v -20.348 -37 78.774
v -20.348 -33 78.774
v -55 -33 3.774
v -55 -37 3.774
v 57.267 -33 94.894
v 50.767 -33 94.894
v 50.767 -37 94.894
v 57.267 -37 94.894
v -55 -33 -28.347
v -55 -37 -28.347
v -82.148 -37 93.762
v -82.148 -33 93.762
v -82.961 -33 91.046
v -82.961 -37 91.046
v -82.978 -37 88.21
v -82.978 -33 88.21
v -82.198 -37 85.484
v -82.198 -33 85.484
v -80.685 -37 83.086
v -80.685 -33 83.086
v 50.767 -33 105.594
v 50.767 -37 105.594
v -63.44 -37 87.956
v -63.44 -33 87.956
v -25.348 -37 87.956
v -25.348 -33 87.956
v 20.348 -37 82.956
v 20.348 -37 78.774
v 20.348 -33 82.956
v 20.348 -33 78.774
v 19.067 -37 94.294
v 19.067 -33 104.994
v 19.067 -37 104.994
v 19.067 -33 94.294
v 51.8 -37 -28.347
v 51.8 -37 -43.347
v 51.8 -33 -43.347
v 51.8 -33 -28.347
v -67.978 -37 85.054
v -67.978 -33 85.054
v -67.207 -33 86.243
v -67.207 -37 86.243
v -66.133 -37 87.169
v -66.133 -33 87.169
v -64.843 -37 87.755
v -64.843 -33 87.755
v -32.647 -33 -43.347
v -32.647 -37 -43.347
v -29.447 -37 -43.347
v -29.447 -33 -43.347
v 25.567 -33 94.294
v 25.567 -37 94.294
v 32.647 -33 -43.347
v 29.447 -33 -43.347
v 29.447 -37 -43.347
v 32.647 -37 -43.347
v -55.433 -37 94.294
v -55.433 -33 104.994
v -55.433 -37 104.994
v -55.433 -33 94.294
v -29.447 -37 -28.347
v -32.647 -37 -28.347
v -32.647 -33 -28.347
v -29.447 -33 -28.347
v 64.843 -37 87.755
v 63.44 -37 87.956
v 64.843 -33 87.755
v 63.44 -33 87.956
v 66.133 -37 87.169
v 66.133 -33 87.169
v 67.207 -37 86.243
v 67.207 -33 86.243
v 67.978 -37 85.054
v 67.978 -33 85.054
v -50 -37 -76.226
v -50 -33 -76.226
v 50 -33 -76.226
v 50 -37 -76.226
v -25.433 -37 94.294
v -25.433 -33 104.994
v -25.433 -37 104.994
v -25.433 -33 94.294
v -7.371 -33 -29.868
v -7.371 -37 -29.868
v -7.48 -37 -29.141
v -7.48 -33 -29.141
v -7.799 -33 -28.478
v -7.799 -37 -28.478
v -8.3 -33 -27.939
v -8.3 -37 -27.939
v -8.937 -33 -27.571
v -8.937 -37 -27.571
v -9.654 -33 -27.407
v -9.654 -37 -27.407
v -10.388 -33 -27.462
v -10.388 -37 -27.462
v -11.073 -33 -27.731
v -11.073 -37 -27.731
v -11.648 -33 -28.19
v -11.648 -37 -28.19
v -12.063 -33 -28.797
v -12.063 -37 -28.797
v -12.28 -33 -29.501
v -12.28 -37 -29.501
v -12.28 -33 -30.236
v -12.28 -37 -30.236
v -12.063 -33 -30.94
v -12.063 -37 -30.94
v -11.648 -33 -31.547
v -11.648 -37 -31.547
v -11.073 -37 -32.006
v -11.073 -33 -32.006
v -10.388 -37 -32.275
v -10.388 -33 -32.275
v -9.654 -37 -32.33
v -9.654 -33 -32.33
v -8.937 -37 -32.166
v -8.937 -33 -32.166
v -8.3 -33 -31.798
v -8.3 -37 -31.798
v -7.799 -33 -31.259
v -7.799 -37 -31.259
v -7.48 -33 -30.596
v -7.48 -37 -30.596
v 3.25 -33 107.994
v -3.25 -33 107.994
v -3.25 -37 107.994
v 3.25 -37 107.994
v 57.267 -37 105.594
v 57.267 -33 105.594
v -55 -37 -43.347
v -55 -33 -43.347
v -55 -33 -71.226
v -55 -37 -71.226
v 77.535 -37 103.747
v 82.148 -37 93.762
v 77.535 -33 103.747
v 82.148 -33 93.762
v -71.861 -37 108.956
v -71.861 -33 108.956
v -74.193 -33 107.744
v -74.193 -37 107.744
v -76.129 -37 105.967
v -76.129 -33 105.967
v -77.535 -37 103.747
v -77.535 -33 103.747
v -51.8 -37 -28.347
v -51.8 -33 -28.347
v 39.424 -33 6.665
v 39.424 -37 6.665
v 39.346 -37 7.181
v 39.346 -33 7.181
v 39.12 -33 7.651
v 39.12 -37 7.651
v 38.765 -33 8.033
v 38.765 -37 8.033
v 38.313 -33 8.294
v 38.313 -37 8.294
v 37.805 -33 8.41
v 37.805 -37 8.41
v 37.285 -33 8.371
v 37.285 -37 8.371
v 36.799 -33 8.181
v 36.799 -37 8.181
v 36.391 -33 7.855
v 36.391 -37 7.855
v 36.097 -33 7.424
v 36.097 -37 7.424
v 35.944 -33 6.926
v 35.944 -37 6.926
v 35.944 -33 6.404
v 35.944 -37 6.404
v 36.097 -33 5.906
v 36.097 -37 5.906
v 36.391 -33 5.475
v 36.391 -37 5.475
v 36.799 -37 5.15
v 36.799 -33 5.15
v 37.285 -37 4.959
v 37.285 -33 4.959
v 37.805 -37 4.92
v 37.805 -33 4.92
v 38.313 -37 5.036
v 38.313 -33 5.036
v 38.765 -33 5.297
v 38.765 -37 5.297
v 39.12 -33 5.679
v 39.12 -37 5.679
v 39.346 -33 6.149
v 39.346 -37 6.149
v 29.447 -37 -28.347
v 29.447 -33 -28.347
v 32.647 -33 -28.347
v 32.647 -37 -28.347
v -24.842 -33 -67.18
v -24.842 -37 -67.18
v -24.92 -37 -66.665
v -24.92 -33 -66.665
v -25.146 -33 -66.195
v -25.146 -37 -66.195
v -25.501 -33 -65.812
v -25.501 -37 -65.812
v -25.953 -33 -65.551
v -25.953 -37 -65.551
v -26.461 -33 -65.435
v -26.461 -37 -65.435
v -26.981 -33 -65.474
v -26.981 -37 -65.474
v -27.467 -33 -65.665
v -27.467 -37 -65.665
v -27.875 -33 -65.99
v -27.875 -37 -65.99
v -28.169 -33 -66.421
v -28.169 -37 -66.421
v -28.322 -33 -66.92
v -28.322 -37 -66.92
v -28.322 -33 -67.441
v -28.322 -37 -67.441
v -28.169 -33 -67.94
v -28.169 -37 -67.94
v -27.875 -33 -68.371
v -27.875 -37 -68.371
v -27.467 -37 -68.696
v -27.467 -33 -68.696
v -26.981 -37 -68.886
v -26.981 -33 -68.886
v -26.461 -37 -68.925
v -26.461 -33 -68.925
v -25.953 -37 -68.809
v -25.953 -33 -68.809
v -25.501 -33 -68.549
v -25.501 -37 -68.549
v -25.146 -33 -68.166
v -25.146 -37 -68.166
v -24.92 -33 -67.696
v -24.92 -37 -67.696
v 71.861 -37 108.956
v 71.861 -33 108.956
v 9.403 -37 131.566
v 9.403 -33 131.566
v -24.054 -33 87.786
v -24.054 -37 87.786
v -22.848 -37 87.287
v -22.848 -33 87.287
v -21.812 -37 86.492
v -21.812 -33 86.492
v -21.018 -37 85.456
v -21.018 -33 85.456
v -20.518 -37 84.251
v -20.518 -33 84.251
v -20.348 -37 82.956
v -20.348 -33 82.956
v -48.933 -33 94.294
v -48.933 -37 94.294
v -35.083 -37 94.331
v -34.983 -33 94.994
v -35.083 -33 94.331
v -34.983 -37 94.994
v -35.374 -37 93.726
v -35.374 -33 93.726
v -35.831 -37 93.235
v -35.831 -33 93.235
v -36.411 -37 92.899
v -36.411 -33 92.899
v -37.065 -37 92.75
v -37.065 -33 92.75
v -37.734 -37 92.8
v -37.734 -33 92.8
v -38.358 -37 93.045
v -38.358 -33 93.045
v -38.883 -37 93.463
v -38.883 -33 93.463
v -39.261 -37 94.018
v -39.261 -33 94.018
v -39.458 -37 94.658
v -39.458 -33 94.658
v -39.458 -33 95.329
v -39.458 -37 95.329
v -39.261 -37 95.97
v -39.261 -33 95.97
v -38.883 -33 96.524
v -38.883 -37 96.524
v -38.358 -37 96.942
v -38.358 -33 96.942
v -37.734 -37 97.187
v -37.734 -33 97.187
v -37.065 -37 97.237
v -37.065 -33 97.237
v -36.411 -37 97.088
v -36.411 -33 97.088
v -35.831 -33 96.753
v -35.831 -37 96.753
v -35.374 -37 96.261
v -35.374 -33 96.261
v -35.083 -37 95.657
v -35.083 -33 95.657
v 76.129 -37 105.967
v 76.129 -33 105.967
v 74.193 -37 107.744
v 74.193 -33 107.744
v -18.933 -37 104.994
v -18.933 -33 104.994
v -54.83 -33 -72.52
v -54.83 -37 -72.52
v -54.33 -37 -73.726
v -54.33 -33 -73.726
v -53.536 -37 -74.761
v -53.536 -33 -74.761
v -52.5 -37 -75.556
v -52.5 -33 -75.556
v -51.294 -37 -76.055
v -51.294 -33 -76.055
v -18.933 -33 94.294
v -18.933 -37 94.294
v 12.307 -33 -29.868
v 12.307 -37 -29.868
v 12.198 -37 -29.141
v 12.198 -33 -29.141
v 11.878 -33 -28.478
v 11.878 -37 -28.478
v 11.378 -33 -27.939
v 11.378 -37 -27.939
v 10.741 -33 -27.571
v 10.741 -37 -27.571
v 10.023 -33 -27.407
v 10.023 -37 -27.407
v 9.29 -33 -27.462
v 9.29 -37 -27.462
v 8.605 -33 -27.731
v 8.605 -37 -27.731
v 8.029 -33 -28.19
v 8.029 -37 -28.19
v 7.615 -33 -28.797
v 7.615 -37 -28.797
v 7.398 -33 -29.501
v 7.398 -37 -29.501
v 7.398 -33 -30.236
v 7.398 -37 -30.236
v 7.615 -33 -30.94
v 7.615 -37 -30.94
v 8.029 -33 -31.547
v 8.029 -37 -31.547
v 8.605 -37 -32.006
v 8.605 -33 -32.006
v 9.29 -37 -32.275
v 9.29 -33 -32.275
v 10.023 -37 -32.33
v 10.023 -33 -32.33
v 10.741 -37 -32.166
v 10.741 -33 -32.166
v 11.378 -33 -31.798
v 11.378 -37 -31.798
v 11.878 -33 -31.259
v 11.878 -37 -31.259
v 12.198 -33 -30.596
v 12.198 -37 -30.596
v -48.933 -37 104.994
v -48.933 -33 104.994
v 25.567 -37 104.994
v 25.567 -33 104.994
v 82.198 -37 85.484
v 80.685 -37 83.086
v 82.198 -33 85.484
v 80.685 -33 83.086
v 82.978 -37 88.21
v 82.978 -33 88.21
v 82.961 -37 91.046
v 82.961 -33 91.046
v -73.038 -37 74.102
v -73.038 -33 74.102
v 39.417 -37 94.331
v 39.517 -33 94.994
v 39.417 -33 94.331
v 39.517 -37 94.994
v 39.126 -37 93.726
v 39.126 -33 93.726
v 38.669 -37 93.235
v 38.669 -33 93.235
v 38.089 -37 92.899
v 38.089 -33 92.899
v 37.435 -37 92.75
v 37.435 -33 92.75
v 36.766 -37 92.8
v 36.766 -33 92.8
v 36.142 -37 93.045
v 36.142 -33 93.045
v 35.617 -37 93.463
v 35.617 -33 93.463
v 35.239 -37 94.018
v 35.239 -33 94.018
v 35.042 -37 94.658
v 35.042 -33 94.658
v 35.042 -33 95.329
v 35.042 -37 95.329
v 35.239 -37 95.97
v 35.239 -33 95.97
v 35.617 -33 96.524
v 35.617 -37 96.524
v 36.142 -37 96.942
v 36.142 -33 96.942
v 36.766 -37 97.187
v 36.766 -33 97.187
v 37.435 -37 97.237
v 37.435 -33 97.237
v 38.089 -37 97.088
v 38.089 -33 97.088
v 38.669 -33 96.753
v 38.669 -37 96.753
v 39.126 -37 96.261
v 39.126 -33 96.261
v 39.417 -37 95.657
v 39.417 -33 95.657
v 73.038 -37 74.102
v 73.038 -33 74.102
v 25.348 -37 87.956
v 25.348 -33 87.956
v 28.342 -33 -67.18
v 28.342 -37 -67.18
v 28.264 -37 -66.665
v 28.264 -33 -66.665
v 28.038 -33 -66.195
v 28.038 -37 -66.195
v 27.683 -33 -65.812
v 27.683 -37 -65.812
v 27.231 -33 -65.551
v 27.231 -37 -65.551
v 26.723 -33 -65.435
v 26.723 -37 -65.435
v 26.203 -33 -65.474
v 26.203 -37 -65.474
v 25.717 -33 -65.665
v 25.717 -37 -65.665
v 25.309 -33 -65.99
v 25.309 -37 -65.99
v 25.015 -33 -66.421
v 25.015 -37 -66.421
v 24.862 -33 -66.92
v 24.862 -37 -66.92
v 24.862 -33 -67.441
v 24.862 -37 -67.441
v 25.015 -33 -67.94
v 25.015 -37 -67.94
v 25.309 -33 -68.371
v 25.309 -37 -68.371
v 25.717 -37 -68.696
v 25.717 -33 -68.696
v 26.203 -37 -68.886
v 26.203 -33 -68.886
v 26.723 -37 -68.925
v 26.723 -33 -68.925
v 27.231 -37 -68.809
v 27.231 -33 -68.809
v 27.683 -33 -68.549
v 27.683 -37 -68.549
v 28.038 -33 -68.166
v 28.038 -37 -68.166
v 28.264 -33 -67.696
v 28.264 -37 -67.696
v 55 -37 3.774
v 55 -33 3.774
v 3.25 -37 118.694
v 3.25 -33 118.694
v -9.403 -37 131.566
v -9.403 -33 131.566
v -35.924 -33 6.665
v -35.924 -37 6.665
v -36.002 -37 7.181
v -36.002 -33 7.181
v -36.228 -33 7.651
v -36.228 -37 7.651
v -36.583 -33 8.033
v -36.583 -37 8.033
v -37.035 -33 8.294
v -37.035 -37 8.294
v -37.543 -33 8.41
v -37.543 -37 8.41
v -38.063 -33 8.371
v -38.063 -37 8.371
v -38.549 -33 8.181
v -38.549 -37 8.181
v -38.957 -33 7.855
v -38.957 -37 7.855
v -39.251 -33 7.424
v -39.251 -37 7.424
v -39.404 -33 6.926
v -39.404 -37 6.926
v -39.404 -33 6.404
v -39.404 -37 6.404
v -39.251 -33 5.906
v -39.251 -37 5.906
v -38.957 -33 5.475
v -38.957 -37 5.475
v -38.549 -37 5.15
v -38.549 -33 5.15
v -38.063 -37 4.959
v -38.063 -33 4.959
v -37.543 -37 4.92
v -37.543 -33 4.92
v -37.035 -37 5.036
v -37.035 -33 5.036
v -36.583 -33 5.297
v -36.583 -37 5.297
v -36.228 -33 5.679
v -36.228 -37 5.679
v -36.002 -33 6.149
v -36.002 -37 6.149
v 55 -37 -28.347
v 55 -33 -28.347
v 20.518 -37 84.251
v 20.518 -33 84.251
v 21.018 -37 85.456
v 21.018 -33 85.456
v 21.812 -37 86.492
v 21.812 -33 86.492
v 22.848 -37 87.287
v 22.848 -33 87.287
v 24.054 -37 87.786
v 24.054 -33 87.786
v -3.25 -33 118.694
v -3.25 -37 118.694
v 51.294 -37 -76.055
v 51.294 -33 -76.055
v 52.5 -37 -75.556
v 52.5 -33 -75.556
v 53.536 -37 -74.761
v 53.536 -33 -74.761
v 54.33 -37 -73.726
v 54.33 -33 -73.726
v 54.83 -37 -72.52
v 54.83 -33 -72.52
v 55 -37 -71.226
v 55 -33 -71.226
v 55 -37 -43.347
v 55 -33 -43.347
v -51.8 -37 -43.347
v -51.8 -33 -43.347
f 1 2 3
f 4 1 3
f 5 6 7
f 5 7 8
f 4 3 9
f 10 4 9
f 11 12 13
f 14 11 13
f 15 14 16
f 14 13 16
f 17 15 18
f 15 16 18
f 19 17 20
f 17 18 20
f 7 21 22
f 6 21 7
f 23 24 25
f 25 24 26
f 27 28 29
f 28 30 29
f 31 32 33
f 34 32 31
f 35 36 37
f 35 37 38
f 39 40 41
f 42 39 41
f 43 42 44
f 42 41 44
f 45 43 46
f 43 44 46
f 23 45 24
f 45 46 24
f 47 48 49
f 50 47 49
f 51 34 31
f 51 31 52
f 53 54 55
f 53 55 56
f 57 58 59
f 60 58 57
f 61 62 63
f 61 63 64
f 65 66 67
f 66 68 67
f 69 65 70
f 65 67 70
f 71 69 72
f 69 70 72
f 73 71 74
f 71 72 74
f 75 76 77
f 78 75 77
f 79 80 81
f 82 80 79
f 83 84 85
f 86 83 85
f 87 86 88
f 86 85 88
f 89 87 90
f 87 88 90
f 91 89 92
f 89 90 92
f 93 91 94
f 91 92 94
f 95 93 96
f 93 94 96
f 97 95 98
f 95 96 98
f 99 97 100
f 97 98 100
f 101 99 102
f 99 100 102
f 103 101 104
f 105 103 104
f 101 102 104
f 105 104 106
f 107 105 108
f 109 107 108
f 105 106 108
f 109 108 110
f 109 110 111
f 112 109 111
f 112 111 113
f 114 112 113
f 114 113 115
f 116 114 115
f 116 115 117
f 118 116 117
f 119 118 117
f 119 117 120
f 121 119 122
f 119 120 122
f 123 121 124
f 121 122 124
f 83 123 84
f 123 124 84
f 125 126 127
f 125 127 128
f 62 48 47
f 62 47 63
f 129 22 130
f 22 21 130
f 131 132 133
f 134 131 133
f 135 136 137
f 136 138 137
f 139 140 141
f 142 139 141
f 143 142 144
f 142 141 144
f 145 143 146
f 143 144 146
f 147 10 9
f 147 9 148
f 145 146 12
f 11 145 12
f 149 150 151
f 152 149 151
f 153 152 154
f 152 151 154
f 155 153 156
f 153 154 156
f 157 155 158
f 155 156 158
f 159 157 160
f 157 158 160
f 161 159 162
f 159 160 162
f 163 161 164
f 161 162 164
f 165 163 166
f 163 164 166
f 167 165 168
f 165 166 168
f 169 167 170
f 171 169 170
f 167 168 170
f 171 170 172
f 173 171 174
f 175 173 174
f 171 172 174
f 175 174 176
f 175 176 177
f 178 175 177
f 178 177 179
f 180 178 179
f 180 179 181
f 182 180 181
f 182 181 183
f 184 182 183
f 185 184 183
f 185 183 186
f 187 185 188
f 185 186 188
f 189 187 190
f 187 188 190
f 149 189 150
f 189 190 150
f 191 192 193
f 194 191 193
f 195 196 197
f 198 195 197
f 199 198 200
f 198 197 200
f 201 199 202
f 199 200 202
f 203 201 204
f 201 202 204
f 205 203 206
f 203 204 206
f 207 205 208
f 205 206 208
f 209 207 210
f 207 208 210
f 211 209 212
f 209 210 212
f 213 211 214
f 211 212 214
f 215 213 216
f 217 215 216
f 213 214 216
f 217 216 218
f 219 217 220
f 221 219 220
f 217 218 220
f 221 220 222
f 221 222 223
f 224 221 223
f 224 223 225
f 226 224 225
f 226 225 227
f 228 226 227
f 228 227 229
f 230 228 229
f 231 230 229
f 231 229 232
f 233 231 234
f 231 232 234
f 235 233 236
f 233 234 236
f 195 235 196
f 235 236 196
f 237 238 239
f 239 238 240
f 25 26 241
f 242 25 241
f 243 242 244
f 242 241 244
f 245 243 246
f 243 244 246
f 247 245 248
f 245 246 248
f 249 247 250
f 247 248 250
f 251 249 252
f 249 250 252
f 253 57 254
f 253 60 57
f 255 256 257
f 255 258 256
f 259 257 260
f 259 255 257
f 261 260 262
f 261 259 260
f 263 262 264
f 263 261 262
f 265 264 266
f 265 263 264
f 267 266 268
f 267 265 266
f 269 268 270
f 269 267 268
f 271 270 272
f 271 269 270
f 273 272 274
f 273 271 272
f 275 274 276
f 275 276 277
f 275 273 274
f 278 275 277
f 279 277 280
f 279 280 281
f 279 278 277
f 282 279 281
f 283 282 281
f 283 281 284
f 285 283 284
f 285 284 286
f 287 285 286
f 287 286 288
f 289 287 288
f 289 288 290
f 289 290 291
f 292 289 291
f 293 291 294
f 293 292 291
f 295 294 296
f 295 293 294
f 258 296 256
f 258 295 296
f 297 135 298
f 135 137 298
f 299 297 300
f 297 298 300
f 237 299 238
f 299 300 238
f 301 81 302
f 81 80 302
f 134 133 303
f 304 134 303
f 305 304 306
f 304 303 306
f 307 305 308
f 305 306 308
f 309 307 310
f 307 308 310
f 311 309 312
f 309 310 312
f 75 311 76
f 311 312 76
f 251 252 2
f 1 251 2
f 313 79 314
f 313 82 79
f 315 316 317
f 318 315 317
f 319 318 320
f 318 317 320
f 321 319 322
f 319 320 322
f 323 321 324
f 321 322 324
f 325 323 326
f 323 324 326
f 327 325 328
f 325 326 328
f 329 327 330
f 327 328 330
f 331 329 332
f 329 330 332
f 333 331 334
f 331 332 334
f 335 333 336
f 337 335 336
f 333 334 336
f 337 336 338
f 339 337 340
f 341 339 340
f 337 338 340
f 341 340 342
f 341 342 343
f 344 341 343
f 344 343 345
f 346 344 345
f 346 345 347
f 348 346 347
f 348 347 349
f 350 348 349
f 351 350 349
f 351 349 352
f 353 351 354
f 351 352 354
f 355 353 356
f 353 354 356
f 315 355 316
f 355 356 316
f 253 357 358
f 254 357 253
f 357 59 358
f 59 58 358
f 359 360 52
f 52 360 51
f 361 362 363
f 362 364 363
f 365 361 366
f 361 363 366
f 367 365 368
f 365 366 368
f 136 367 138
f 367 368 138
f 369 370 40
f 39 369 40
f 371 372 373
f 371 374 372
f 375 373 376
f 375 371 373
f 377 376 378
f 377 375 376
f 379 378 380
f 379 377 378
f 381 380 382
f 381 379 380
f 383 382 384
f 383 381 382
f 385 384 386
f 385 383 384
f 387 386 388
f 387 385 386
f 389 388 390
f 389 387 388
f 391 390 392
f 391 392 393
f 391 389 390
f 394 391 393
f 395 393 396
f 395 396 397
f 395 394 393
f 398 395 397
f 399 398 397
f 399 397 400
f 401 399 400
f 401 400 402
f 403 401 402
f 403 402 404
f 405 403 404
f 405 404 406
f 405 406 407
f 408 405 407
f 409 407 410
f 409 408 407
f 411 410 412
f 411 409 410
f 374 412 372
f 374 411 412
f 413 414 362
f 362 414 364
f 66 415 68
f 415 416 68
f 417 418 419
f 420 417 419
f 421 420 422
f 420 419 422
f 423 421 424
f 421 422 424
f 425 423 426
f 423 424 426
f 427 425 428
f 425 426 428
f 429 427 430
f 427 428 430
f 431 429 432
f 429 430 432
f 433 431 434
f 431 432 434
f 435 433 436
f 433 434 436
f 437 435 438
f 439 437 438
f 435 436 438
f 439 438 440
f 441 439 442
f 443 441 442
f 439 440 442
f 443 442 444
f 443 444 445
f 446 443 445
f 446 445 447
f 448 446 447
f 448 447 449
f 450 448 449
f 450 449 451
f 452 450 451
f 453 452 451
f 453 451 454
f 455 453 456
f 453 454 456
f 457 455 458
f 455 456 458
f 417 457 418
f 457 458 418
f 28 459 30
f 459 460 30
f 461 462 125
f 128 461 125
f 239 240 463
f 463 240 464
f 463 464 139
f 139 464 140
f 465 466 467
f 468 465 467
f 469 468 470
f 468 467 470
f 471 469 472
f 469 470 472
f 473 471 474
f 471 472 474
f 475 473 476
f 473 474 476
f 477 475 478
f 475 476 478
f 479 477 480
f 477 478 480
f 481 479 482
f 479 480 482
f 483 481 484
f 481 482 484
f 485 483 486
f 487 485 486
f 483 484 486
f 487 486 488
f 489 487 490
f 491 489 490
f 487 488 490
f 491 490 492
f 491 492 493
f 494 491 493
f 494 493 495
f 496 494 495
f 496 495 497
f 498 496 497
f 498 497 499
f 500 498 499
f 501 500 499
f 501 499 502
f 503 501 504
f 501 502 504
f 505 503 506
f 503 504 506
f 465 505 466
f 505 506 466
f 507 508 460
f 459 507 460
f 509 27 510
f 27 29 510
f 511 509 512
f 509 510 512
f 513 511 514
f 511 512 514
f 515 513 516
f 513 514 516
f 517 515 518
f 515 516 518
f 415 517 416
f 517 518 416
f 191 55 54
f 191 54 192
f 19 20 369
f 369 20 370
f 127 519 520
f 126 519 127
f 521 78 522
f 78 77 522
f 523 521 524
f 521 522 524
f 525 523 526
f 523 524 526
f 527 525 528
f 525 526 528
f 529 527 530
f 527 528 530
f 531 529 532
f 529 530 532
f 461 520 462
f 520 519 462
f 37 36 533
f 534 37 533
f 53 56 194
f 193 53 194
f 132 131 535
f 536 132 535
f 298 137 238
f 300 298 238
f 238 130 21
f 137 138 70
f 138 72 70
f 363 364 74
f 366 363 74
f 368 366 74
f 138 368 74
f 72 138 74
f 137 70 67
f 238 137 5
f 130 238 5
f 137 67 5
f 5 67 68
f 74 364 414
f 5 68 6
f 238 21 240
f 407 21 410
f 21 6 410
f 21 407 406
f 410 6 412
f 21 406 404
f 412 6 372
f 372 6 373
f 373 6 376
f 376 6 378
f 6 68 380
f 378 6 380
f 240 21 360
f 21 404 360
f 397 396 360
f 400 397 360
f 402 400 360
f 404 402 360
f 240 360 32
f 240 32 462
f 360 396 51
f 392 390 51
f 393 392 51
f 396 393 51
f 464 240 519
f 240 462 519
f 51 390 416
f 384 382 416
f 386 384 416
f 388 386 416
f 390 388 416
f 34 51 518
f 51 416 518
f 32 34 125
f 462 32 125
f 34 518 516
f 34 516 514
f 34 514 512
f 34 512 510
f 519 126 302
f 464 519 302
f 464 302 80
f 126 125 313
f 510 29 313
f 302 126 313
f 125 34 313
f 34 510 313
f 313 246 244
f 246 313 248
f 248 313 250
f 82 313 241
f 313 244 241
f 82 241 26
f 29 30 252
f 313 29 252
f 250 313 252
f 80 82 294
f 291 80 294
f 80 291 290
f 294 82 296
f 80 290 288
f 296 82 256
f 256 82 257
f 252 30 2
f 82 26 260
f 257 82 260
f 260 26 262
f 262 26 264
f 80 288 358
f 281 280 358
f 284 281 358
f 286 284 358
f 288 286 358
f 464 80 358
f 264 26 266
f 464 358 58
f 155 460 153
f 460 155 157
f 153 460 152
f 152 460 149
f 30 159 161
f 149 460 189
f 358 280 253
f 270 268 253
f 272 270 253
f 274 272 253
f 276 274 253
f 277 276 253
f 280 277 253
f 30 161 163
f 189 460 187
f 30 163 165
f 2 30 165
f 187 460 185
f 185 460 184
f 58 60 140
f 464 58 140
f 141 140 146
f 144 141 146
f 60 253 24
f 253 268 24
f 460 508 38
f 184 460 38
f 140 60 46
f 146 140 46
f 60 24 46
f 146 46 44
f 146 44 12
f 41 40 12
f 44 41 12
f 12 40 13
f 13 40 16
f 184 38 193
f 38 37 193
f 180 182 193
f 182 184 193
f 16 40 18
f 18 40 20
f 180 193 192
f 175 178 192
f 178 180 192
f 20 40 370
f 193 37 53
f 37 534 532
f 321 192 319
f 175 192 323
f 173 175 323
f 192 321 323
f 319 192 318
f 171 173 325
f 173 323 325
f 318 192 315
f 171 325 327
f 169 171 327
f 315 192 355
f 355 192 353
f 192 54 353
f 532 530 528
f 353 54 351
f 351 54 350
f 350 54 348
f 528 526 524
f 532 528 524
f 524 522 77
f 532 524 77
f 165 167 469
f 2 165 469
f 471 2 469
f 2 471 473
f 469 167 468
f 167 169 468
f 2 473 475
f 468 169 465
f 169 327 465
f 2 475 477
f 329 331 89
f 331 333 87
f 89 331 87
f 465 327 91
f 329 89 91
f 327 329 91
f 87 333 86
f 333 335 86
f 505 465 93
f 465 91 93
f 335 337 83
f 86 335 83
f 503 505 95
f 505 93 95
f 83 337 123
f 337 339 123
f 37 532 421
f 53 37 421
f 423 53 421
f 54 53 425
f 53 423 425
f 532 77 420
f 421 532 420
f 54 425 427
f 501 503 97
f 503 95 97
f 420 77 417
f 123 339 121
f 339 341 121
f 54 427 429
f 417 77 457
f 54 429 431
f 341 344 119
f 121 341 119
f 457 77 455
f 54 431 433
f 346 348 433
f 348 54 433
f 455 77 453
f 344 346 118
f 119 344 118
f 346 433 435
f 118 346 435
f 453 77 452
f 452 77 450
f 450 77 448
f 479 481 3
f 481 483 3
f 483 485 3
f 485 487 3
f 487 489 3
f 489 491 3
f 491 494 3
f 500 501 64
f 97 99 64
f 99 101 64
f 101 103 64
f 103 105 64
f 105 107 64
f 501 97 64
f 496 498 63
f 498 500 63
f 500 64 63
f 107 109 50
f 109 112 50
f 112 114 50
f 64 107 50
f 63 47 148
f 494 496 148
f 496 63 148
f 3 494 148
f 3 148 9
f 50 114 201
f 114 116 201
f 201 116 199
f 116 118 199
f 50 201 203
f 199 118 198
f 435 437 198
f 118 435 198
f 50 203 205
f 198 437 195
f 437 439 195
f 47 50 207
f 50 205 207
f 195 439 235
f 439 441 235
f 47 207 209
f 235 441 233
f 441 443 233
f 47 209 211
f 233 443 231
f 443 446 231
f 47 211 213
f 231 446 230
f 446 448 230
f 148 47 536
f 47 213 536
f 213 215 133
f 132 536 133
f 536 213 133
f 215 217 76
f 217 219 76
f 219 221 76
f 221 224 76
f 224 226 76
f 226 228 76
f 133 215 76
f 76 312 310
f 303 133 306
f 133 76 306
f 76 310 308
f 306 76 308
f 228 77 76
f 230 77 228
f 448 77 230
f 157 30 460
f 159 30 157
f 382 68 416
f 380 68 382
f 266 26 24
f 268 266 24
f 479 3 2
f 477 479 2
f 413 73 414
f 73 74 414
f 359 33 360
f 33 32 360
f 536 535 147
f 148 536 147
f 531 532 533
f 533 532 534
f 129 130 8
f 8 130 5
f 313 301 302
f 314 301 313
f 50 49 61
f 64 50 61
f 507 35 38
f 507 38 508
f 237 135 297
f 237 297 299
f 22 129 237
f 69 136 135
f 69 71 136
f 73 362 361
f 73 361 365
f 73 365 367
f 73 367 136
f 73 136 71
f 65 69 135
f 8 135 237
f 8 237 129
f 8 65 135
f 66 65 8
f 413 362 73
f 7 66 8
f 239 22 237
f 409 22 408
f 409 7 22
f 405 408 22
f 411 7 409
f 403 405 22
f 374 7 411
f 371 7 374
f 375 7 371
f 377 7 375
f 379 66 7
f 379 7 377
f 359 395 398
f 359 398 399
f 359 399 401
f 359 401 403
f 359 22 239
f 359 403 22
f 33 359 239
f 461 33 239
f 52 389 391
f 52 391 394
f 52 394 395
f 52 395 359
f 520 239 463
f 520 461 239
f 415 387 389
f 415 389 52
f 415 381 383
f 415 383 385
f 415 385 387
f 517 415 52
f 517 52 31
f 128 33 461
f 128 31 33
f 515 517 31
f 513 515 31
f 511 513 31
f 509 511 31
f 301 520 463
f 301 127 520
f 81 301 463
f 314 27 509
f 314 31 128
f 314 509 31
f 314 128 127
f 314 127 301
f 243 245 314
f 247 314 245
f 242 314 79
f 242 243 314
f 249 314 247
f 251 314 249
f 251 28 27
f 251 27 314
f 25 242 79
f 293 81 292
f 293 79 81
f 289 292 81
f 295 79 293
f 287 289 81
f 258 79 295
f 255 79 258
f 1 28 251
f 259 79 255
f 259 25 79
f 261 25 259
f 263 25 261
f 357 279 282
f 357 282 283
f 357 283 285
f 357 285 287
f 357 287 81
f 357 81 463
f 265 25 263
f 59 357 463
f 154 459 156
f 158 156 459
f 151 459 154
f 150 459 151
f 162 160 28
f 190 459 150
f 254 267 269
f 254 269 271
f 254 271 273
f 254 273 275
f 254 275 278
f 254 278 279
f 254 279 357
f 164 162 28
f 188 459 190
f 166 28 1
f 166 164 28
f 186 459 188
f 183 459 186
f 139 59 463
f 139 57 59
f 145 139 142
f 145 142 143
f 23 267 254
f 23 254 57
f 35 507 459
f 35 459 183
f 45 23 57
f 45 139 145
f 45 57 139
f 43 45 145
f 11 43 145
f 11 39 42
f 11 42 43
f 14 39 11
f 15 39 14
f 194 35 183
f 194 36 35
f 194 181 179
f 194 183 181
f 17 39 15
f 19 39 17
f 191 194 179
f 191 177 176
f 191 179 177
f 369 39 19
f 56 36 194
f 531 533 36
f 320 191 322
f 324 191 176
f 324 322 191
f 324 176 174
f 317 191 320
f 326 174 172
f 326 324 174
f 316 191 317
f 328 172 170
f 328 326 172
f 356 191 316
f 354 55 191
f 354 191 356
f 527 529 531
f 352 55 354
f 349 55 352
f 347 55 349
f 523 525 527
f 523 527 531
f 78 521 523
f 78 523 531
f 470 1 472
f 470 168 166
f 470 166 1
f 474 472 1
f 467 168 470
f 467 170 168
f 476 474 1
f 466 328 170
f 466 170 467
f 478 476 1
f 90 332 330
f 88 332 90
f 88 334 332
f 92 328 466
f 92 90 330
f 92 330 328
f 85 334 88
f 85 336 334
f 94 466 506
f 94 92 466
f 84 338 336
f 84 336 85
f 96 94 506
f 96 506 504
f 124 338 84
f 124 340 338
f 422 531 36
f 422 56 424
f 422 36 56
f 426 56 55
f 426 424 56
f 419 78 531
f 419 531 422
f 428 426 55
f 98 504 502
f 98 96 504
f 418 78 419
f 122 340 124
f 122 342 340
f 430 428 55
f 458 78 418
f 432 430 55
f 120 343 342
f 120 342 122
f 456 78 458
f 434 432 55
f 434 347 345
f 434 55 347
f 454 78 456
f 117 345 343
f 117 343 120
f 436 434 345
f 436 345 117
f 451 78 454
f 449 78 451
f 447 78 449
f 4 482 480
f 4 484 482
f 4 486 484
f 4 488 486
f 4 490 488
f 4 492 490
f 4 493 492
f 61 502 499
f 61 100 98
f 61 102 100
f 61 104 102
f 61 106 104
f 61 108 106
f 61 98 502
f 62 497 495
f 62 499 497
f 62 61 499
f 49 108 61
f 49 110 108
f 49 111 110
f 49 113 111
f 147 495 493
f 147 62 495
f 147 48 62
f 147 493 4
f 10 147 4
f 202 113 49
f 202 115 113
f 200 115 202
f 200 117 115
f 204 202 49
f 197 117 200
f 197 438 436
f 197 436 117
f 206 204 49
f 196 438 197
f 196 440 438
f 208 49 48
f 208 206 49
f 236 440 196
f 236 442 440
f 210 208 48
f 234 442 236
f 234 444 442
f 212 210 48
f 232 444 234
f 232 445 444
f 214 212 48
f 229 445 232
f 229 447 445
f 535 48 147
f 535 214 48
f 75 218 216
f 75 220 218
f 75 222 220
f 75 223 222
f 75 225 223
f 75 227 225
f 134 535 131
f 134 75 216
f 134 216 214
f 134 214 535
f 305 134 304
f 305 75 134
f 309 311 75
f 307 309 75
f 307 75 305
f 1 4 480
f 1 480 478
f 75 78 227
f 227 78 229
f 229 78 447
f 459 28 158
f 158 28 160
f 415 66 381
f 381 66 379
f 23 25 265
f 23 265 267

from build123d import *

# Parameters (mm, degrees)
SKETCH1_R           = 2.25
SKETCH1_W           = 6.5
SKETCH1_H           = 10.7
BOSS_EXTRUDE1_DEPTH = 2
SKETCH3_W           = 4
SKETCH3_H           = 15
BOSS_EXTRUDE2_DEPTH = 16
FILLET1_R           = 10
FILLET2_R           = 4
CHAMFER1_SIZE       = 3
CHAMFER1_SIZE2      = 5.196152423
CUT_EXTRUDE2_DEPTH  = 16
SKETCH10_R          = 2.468429883
SKETCH10_R_2        = 1.75
SKETCH10_W          = 3.2
SKETCH10_H          = 15
CUT_EXTRUDE3_DEPTH  = 4
SKETCH12_W          = 53.277727804
SKETCH12_H          = 68.29561081
CUT_EXTRUDE4_DEPTH  = 23


with BuildPart() as part:
    # Sketch1 → Boss-Extrude1 (new body, symmetric)
    with BuildSketch(Plane(origin=(0, -35, 0), x_dir=(1, 0, 0), z_dir=(0, 1, 0))):
        with BuildLine():
            Line((-50, 76.225749335), (50, 76.225749335))
            ThreePointArc((50, 76.225749335), (53.535533906, 74.761283241), (55, 71.225749335))
            Line((55, 71.225749335), (55, -3.774250665))
            Line((55, -3.774250665), (20.347942177, -78.774250665))
            Line((20.347942177, -78.774250665), (20.347942177, -82.95646352))
            ThreePointArc((20.347942177, -82.95646352), (21.812408271, -86.491997426), (25.347942177, -87.95646352))
            Line((25.347942177, -87.95646352), (63.43950887, -87.95646352))
            ThreePointArc((63.43950887, -87.95646352), (66.133427762, -87.168683956), (67.978460954, -85.053583921))
            Line((67.978460954, -85.053583921), (73.038309614, -74.102180936))
            Line((73.038309614, -74.102180936), (80.685361178, -83.086313097))
            ThreePointArc((80.685361178, -83.086313097), (82.977793564, -88.210367772), (82.148282135, -93.762222718))
            Line((82.148282135, -93.762222718), (77.534981649, -103.747128614))
            ThreePointArc((77.534981649, -103.747128614), (75.219554646, -106.919630821), (71.860949779, -108.955741281))
            Line((71.860949779, -108.955741281), (9.40285347, -131.565833476))
            Line((9.40285347, -131.565833476), (-9.40285347, -131.565833476))
            Line((-9.40285347, -131.565833476), (-71.860949779, -108.955741281))
            ThreePointArc((-71.860949779, -108.955741281), (-75.219554646, -106.919630821), (-77.534981649, -103.747128614))
            Line((-77.534981649, -103.747128614), (-82.148282135, -93.762222718))
            ThreePointArc((-82.148282135, -93.762222718), (-82.977793564, -88.210367772), (-80.685361178, -83.086313097))
            Line((-80.685361178, -83.086313097), (-73.038309614, -74.102180936))
            Line((-73.038309614, -74.102180936), (-67.978460954, -85.053583921))
            ThreePointArc((-67.978460954, -85.053583921), (-66.133427762, -87.168683956), (-63.43950887, -87.95646352))
            Line((-63.43950887, -87.95646352), (-25.347942177, -87.95646352))
            ThreePointArc((-25.347942177, -87.95646352), (-21.812408271, -86.491997426), (-20.347942177, -82.95646352))
            Line((-20.347942177, -82.95646352), (-20.347942177, -78.774250665))
            Line((-20.347942177, -78.774250665), (-55, -3.774250665))
            Line((-55, -3.774250665), (-55, 71.225749335))
            ThreePointArc((-55, 71.225749335), (-53.535533906, 74.761283241), (-50, 76.225749335))
        make_face()
        with Locations((-37.233481524, -94.993785432)):
            Circle(SKETCH1_R, mode=Mode.SUBTRACT)
        with Locations((37.266518397, -94.993786505)):
            Circle(SKETCH1_R, mode=Mode.SUBTRACT)
        with Locations((-52.183481524, -99.643785432)):
            Rectangle(SKETCH1_W, SKETCH1_H, mode=Mode.SUBTRACT)
        with Locations((-22.183481524, -99.643785432)):
            Rectangle(SKETCH1_W, SKETCH1_H, mode=Mode.SUBTRACT)
        with Locations((22.316518476, -99.643785432)):
            Rectangle(SKETCH1_W, SKETCH1_H, mode=Mode.SUBTRACT)
        with Locations((54.016518476, -100.243785432)):
            Rectangle(SKETCH1_W, SKETCH1_H, mode=Mode.SUBTRACT)
        with Locations((0, -113.343785432)):
            Rectangle(SKETCH1_W, SKETCH1_H, mode=Mode.SUBTRACT)
    extrude(amount=BOSS_EXTRUDE1_DEPTH, both=True)

    # Sketch3 → Boss-Extrude2 (add)
    with BuildSketch(Plane.XZ.offset(37)):
        with Locations((0, 80.45646352)):
            Rectangle(SKETCH3_W, SKETCH3_H)
    extrude(amount=BOSS_EXTRUDE2_DEPTH)

    # Fillet1
    fillet1_edges = [part.edges().sort_by_distance(p)[0] for p in [
        (0, -53, 87.95646352),
    ]]
    fillet(fillet1_edges, radius=FILLET1_R)

    # Fillet2
    fillet2_edges = [part.edges().sort_by_distance(p)[0] for p in [
        (0, -53, 72.95646352),
    ]]
    fillet(fillet2_edges, radius=FILLET2_R)

    # Chamfer1
    chamfer1_edges = [part.edges().sort_by_distance(p)[0] for p in [
        (0, -37, 87.95646352),
        (-2, -37, 80.45646352),
        (0, -37, 72.95646352),
        (2, -37, 80.45646352),
    ]]
    chamfer1_side = [part.faces().sort_by_distance(p)[0] for p in [
        (-0.006927699, -37, 22.010129075),
    ]]
    chamfer(chamfer1_edges, length=CHAMFER1_SIZE, length2=CHAMFER1_SIZE2, reference=chamfer1_side[0])

    # Sketch7 → Cut-Extrude2 (cut)
    with BuildSketch(Plane.ZY.offset(2)):
        with BuildLine():
            add(Edge.make_bspline(
                [(72.95646352, -42.196152423), (75.352950237, -47.994562928), (72.95646352, -49)],
                knots=[0, 0, 0, 0.704450442, 0.704450442, 0.704450442], degree=2))
            Line((72.95646352, -42.196152423), (72.95646352, -49))
        make_face()
    extrude(amount=-CUT_EXTRUDE2_DEPTH, mode=Mode.SUBTRACT)

    # Sketch10 → Cut-Extrude3 (cut)
    with BuildSketch(Plane.XZ.offset(37)):
        with Locations((-9.838945551, -29.868495219)):
            Circle(SKETCH10_R)
        with Locations((9.838945551, -29.868495219)):
            Circle(SKETCH10_R)
        with Locations((-37.673971089, 6.665090314)):
            Circle(SKETCH10_R_2)
        with Locations((-26.592001418, -67.180357374)):
            Circle(SKETCH10_R_2)
        with Locations((37.673971089, 6.665090314)):
            Circle(SKETCH10_R_2)
        with Locations((26.592001418, -67.180357374)):
            Circle(SKETCH10_R_2)
        with Locations((-53.4, -35.847350079)):
            Rectangle(SKETCH10_W, SKETCH10_H)
        with Locations((-31.047145488, -35.847350079)):
            Rectangle(SKETCH10_W, SKETCH10_H)
        with Locations((31.047145488, -35.847350079)):
            Rectangle(SKETCH10_W, SKETCH10_H)
        with Locations((53.4, -35.847350079)):
            Rectangle(SKETCH10_W, SKETCH10_H)
    extrude(amount=-CUT_EXTRUDE3_DEPTH, mode=Mode.SUBTRACT)

    # Sketch12 → Cut-Extrude4 (cut)
    with BuildSketch(Plane(origin=(0, -37, 0), x_dir=(-1, 0, 0), z_dir=(0, -1, 0))):
        with Locations((0.715137286, -79.433896391)):
            Rectangle(SKETCH12_W, SKETCH12_H)
    extrude(amount=CUT_EXTRUDE4_DEPTH, mode=Mode.SUBTRACT)


solid = part.part
